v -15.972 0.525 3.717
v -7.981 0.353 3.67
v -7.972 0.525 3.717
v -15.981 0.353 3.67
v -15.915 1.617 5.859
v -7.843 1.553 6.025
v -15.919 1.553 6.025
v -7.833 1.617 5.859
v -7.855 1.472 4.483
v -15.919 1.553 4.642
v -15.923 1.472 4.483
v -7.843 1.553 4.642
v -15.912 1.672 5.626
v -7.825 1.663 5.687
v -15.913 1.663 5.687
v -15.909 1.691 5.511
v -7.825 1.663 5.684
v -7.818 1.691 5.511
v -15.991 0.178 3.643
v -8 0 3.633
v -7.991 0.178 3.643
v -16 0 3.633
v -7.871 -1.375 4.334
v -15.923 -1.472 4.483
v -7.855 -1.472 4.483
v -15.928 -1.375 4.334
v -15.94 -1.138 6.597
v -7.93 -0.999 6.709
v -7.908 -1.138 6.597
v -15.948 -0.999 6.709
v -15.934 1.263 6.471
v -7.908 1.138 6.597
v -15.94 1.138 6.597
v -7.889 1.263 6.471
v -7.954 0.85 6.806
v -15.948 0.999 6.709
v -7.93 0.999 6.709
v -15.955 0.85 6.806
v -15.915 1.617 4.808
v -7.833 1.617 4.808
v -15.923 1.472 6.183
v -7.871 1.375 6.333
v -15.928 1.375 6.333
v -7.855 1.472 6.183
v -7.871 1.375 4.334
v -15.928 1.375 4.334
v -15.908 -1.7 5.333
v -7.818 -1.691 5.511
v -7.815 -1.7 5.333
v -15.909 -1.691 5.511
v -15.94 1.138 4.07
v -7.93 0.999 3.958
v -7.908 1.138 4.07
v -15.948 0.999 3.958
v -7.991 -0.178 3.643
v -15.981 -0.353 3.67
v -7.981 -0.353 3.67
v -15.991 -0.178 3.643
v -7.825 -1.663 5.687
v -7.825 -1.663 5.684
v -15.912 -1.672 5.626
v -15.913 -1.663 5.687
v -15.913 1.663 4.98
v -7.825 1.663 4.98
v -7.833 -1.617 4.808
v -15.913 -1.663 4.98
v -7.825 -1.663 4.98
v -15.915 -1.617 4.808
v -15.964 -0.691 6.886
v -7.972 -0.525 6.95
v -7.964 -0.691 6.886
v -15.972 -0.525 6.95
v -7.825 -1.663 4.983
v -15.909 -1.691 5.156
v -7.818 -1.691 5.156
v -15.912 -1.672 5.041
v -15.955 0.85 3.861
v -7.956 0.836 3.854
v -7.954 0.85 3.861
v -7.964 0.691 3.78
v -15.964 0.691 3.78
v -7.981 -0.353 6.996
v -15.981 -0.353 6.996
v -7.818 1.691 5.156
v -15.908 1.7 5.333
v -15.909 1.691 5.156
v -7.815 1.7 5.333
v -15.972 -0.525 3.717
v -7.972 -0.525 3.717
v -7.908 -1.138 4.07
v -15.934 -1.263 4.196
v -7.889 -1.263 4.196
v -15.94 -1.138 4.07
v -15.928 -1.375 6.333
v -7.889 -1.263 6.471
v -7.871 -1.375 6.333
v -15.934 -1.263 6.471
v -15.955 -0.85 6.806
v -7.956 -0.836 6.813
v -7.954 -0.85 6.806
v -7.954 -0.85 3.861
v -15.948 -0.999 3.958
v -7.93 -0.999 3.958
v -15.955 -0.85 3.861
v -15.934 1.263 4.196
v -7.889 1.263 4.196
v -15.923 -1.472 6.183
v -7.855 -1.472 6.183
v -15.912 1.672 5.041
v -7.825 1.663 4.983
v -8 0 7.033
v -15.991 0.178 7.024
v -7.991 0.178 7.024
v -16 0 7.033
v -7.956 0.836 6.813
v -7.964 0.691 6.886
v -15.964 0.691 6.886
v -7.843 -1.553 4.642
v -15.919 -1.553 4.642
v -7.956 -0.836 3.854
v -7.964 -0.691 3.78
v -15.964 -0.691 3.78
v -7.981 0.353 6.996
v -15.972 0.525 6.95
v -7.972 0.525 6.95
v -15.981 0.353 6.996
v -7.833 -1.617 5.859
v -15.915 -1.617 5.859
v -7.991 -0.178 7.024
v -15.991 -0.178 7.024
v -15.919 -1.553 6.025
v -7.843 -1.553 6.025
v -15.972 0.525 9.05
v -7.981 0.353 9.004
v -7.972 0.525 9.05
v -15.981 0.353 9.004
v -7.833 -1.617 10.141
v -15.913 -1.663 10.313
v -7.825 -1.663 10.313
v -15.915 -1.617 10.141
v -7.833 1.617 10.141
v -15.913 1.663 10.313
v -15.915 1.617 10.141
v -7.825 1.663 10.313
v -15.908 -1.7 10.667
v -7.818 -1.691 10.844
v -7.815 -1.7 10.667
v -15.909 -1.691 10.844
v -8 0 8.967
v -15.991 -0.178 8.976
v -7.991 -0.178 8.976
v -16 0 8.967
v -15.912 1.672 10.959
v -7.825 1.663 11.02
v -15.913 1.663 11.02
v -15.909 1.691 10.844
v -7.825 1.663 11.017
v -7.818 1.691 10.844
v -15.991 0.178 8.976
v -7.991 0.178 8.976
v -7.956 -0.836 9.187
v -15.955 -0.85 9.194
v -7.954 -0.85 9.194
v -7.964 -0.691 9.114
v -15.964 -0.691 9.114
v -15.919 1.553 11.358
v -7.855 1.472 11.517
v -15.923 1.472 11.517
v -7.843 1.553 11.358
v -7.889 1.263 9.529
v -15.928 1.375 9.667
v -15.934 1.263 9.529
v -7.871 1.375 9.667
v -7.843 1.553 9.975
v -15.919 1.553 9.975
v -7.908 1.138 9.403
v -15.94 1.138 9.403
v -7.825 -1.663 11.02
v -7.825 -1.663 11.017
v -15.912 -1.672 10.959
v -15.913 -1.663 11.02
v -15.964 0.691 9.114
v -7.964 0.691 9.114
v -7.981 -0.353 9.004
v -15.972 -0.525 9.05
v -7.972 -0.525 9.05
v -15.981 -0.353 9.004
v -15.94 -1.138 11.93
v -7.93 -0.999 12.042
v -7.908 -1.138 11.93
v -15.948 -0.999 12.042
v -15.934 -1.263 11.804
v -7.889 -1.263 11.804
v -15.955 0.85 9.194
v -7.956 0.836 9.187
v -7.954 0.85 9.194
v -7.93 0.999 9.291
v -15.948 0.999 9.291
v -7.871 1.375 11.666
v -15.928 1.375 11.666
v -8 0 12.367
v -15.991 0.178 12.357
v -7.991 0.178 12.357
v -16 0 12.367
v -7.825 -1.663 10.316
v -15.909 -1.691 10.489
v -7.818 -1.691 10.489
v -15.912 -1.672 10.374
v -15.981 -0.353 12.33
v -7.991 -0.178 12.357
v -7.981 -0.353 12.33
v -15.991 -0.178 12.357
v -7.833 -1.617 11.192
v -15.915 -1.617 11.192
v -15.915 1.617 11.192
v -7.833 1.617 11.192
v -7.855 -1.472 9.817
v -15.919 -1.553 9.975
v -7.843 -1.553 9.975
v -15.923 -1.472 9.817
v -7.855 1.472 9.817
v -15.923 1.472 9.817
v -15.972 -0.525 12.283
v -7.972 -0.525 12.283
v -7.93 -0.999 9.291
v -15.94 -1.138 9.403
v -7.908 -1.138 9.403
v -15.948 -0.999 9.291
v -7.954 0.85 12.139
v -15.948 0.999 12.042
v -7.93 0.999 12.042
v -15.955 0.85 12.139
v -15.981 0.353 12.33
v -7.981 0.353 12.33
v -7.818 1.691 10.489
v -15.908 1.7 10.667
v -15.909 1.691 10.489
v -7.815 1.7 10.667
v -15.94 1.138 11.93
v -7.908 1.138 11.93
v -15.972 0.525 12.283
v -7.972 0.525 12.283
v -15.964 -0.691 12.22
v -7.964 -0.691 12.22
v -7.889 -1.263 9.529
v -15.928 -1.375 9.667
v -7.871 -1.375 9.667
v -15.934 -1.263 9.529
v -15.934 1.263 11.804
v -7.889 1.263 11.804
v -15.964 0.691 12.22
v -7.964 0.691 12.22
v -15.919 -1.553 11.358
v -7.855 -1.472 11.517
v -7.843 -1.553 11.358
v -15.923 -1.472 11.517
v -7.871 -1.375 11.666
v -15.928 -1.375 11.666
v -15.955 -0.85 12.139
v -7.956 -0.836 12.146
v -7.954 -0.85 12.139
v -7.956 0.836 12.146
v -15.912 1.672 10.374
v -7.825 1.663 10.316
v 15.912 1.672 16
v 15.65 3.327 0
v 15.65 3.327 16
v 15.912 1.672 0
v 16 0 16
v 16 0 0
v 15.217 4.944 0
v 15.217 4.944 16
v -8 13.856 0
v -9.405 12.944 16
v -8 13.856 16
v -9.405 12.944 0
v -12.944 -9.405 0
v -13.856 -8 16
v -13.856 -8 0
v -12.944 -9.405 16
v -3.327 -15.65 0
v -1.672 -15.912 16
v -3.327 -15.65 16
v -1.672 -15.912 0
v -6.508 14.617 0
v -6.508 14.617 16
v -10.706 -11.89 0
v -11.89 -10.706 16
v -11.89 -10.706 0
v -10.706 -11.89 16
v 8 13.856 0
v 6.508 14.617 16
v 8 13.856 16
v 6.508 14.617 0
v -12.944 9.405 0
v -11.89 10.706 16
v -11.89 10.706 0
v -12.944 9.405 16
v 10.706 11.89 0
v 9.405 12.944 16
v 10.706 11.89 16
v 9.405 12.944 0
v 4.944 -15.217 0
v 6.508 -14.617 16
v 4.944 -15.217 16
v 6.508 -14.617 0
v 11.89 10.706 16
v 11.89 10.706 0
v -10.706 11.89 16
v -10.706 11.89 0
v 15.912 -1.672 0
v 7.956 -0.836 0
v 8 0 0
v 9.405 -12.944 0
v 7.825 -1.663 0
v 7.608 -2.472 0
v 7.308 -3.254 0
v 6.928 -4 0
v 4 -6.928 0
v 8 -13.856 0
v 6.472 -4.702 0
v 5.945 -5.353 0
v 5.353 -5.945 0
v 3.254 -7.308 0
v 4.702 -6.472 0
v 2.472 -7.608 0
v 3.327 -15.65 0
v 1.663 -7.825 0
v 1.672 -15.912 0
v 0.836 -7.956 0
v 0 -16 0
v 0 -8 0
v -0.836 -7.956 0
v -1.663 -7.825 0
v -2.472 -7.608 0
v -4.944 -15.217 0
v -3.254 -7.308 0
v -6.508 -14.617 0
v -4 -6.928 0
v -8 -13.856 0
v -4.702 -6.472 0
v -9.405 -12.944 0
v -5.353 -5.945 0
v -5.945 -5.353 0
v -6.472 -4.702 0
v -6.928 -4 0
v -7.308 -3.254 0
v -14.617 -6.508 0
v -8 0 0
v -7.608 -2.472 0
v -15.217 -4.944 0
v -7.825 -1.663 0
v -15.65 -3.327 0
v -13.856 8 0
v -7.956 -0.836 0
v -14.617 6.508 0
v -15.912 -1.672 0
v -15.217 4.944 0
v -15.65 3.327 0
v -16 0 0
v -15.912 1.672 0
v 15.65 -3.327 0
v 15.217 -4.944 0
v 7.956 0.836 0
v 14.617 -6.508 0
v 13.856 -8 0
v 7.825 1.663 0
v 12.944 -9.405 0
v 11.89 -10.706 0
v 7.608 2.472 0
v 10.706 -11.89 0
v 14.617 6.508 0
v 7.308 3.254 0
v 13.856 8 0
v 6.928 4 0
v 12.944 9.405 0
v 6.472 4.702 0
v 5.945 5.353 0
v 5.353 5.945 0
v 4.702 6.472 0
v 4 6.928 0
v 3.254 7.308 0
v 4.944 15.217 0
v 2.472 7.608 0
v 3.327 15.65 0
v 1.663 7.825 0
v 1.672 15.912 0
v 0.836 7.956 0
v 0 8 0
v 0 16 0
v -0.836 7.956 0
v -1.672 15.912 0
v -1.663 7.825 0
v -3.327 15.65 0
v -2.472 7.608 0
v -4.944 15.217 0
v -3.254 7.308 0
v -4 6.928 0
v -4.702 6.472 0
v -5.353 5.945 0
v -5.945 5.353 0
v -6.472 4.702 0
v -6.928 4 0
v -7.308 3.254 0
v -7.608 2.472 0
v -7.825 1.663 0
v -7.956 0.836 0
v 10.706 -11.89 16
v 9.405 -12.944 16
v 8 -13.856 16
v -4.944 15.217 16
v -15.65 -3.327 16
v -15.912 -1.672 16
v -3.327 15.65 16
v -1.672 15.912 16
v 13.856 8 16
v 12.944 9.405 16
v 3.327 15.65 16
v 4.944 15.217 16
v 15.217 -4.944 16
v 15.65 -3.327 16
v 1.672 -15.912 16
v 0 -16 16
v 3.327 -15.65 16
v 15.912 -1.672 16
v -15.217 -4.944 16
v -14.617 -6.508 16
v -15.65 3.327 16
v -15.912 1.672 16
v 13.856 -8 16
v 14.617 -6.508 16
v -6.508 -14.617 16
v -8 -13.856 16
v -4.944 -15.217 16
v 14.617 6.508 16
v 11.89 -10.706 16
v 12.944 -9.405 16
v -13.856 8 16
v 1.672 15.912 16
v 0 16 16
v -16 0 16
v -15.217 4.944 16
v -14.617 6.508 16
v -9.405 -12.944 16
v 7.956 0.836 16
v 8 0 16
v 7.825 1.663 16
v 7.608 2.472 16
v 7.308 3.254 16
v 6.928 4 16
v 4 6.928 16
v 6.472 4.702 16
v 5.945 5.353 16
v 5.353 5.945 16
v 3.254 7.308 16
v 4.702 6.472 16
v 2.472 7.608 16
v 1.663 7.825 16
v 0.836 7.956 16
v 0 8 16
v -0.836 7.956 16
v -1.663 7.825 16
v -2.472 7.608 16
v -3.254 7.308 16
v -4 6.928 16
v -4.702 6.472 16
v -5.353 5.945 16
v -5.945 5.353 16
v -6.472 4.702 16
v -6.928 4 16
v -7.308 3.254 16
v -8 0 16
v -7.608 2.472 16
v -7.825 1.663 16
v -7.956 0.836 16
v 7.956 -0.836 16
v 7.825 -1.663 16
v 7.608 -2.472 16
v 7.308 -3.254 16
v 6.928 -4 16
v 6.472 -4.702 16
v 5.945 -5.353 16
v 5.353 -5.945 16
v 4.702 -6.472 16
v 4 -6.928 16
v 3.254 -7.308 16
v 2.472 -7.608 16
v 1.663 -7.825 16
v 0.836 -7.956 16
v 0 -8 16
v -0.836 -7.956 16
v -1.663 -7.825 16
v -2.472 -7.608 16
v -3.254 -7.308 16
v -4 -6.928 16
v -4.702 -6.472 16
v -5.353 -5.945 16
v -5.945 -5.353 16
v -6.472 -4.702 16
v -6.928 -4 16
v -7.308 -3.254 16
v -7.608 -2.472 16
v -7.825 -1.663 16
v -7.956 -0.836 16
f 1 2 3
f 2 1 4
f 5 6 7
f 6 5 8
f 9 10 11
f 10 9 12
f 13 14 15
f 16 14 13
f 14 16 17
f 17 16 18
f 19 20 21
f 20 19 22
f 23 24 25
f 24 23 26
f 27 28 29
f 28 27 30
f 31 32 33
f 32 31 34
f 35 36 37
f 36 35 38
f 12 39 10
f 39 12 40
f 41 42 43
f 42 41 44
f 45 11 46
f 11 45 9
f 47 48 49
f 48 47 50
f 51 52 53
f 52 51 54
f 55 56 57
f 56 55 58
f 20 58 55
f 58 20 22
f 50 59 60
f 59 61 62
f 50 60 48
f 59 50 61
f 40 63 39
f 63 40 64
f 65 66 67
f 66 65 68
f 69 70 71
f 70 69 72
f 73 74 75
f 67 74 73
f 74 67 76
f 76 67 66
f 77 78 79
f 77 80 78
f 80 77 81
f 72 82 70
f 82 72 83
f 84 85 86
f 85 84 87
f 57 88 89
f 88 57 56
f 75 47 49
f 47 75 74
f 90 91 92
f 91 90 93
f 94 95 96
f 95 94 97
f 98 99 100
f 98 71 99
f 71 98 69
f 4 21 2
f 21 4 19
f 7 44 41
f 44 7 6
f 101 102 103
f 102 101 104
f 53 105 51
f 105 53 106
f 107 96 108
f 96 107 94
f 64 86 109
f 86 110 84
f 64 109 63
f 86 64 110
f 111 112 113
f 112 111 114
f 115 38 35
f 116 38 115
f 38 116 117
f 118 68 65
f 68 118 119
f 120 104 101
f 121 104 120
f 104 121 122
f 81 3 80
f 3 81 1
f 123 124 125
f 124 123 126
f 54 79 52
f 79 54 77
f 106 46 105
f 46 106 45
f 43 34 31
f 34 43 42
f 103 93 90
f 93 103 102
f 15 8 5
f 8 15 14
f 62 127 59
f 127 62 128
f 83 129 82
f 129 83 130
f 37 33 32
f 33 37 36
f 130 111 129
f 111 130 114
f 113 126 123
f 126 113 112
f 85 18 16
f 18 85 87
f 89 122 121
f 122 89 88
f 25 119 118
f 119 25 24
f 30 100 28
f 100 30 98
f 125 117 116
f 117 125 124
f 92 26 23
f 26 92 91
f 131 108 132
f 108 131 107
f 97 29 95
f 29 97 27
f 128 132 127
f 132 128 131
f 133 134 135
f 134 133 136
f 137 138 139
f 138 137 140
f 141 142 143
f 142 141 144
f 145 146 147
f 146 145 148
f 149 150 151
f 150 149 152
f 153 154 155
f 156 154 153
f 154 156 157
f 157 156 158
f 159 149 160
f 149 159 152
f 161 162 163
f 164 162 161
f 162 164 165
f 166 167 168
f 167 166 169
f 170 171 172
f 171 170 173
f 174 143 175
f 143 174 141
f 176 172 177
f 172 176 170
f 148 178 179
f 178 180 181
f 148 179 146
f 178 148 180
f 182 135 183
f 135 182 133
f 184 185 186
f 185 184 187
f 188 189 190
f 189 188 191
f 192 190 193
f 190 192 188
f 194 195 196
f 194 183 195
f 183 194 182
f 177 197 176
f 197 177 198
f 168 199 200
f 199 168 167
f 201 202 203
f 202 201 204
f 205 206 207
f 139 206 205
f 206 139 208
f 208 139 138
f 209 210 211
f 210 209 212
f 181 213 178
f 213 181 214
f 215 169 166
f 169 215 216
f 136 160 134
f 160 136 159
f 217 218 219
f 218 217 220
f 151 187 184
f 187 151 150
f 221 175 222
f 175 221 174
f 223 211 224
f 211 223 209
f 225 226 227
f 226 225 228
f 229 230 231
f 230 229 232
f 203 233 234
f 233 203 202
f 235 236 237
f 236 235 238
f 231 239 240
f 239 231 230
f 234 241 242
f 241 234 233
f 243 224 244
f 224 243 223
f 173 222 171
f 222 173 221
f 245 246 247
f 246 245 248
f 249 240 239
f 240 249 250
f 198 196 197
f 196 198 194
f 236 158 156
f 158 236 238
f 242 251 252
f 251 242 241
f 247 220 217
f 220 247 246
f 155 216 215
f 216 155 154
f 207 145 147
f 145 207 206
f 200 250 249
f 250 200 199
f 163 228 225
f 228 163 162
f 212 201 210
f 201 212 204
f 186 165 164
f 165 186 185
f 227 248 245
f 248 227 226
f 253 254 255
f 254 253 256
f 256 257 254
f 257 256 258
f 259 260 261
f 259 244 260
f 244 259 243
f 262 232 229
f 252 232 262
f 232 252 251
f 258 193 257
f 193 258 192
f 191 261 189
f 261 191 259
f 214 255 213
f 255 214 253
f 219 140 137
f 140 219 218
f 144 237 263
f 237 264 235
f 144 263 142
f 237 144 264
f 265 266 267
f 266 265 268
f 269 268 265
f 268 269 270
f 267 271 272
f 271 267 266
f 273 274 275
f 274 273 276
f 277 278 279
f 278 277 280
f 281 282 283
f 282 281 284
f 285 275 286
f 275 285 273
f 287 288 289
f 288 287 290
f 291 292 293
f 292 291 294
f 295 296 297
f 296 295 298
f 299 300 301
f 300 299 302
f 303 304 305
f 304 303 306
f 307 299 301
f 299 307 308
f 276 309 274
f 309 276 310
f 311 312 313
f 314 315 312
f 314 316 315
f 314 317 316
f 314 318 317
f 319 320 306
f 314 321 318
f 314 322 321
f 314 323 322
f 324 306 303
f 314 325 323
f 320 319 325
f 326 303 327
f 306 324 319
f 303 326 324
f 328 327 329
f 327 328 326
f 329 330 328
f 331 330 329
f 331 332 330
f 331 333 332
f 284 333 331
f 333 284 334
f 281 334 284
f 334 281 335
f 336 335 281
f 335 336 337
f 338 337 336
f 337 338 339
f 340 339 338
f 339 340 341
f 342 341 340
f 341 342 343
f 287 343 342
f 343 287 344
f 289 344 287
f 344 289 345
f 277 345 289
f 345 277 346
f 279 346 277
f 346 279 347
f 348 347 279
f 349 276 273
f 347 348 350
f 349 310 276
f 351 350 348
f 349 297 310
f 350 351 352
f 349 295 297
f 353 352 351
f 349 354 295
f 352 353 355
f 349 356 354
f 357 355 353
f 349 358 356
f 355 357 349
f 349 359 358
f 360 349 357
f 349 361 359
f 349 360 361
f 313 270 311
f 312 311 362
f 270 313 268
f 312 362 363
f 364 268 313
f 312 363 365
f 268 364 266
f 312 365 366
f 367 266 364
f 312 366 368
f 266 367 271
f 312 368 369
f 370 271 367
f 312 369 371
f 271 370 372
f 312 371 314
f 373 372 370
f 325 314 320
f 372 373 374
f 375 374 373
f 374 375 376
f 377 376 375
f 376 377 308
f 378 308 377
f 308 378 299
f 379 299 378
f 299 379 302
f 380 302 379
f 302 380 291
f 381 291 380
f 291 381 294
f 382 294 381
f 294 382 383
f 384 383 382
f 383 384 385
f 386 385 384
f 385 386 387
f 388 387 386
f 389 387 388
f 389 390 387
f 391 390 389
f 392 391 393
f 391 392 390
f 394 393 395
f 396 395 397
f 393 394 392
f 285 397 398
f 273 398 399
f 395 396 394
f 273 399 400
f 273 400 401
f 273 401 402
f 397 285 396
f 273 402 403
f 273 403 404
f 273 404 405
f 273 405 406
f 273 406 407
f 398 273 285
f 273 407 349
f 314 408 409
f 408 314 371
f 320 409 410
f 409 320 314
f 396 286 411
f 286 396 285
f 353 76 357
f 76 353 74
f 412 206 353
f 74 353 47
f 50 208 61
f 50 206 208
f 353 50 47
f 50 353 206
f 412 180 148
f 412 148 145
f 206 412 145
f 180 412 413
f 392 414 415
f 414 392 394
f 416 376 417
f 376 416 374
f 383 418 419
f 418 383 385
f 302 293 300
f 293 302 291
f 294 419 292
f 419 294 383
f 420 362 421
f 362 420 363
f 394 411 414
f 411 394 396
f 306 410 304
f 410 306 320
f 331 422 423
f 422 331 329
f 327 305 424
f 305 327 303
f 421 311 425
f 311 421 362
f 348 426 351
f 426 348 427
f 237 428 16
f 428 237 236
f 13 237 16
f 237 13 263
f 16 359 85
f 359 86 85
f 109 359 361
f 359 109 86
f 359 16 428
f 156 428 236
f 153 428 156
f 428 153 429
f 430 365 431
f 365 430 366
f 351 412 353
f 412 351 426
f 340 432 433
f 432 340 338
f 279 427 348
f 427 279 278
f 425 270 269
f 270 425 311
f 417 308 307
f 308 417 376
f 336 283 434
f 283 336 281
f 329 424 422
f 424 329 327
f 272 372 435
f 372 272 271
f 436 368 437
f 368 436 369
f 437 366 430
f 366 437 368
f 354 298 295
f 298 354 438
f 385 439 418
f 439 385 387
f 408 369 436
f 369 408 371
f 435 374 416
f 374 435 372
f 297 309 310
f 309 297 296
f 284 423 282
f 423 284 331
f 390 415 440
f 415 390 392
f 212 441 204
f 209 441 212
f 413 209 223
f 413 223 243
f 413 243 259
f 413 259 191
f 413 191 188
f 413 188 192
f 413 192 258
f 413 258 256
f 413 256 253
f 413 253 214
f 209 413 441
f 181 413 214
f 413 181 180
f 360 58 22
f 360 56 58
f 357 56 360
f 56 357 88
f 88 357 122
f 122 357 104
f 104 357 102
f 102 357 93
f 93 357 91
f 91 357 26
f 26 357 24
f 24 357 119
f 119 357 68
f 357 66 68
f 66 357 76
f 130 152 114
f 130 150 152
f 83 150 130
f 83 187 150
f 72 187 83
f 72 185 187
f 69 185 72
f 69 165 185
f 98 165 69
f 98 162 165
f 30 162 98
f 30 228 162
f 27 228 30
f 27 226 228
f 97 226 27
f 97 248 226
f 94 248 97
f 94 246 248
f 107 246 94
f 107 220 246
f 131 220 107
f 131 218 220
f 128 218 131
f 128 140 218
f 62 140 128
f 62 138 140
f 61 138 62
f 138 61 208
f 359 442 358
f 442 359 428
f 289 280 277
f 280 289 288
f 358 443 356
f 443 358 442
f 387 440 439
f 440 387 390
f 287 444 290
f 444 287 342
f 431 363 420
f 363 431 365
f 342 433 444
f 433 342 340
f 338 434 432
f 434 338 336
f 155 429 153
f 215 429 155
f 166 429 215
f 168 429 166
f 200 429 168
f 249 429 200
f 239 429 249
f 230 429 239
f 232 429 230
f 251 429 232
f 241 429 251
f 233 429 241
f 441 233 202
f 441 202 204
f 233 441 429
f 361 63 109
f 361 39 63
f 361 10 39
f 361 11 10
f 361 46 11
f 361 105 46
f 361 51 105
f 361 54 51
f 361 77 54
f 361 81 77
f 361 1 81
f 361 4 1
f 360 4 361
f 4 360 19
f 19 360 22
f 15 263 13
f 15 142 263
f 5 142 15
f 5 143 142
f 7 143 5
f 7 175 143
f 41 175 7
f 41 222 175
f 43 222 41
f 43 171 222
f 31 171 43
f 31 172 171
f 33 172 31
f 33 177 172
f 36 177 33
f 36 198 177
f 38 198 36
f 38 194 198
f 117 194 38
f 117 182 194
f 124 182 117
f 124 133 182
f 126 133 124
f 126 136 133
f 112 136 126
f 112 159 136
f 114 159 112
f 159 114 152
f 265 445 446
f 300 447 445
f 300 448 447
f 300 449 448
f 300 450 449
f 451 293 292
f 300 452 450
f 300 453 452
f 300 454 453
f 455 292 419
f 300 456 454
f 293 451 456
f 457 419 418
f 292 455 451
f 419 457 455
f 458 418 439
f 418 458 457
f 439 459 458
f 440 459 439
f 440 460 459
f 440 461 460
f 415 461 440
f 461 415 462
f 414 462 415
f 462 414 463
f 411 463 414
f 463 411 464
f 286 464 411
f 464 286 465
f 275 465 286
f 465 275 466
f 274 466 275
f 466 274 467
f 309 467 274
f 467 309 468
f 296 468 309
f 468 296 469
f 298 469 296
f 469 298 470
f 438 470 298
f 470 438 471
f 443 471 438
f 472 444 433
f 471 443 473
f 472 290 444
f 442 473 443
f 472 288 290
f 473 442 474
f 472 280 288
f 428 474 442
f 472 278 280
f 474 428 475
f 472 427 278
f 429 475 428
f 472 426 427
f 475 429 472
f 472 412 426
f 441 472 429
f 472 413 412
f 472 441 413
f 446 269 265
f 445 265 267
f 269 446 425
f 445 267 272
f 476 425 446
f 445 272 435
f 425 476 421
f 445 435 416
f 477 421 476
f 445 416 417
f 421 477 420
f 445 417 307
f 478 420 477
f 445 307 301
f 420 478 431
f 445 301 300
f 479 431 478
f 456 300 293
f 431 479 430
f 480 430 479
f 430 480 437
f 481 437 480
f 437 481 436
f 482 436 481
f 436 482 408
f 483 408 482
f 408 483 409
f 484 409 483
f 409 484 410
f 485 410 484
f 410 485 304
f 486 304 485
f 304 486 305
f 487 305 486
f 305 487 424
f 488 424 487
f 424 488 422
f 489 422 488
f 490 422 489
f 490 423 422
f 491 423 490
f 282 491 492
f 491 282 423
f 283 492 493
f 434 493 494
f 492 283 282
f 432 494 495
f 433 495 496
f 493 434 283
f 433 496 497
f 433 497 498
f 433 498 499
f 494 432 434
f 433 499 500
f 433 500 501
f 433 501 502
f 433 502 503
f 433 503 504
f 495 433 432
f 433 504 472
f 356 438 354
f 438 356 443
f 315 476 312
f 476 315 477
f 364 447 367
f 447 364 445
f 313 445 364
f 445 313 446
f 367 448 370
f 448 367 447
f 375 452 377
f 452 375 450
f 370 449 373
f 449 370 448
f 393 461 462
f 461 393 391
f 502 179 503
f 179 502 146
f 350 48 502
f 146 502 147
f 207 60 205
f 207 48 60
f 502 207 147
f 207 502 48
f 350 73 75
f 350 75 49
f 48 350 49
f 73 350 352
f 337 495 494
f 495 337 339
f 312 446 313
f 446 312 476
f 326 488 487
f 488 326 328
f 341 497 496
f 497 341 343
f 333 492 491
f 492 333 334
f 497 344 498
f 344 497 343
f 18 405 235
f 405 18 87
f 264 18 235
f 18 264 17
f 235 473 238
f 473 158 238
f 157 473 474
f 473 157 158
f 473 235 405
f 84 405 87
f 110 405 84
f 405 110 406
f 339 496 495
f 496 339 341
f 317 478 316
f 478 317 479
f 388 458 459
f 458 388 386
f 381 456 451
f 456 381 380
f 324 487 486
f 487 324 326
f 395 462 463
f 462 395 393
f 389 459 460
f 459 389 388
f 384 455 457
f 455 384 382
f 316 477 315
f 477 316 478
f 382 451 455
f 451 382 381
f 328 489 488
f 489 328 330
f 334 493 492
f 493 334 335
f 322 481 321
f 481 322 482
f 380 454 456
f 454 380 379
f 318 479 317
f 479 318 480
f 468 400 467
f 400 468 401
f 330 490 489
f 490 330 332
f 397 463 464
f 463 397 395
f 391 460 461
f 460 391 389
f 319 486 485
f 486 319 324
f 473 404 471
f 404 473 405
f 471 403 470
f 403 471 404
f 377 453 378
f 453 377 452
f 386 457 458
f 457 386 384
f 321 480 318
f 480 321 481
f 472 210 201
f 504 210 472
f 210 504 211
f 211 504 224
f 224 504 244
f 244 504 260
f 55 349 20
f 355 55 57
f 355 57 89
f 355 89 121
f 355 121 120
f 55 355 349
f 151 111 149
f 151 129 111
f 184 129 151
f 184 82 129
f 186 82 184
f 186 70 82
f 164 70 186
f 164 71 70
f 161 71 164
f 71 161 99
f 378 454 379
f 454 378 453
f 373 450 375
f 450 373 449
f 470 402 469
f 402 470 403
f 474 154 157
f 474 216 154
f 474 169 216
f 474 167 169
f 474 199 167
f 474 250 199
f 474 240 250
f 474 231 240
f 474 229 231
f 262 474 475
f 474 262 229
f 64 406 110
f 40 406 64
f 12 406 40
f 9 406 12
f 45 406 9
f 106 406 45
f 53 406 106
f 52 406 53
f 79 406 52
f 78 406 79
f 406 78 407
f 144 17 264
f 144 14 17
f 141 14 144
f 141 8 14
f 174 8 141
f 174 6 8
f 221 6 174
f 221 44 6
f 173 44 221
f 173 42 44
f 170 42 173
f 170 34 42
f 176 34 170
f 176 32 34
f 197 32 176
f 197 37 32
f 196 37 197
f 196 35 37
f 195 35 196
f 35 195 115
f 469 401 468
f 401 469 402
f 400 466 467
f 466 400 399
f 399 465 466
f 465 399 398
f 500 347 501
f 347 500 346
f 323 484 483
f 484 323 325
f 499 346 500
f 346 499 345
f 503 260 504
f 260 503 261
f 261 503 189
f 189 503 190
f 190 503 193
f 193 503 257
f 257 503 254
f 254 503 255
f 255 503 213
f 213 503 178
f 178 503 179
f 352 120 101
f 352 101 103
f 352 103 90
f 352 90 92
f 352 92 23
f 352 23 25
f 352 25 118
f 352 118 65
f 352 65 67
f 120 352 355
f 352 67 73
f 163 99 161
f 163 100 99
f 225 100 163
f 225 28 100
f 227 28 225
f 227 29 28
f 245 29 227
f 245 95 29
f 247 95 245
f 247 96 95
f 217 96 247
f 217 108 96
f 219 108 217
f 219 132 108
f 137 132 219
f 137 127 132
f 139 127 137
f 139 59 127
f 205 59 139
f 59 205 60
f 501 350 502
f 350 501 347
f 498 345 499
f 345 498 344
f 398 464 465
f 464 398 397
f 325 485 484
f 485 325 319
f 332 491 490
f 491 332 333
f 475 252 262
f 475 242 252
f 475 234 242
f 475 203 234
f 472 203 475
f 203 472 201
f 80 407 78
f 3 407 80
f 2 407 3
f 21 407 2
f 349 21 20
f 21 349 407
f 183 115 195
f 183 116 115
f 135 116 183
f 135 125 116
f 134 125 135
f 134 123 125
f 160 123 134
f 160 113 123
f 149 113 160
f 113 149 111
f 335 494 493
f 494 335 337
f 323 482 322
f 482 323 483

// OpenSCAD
// Double-screw locking collar.
$fn = 60;
eps = 0.02;
shaft_d = 16;
outer_d = 32;
width = 16;
difference() {
    cylinder(d=outer_d,h=width);
    translate([0,0,-eps]) cylinder(d=shaft_d,h=width+2*eps);
    for (z=[width/3,2*width/3]) translate([-outer_d/2-eps,0,z]) rotate([0,90,0]) cylinder(d=3.4,h=outer_d/2+2*eps);
}
